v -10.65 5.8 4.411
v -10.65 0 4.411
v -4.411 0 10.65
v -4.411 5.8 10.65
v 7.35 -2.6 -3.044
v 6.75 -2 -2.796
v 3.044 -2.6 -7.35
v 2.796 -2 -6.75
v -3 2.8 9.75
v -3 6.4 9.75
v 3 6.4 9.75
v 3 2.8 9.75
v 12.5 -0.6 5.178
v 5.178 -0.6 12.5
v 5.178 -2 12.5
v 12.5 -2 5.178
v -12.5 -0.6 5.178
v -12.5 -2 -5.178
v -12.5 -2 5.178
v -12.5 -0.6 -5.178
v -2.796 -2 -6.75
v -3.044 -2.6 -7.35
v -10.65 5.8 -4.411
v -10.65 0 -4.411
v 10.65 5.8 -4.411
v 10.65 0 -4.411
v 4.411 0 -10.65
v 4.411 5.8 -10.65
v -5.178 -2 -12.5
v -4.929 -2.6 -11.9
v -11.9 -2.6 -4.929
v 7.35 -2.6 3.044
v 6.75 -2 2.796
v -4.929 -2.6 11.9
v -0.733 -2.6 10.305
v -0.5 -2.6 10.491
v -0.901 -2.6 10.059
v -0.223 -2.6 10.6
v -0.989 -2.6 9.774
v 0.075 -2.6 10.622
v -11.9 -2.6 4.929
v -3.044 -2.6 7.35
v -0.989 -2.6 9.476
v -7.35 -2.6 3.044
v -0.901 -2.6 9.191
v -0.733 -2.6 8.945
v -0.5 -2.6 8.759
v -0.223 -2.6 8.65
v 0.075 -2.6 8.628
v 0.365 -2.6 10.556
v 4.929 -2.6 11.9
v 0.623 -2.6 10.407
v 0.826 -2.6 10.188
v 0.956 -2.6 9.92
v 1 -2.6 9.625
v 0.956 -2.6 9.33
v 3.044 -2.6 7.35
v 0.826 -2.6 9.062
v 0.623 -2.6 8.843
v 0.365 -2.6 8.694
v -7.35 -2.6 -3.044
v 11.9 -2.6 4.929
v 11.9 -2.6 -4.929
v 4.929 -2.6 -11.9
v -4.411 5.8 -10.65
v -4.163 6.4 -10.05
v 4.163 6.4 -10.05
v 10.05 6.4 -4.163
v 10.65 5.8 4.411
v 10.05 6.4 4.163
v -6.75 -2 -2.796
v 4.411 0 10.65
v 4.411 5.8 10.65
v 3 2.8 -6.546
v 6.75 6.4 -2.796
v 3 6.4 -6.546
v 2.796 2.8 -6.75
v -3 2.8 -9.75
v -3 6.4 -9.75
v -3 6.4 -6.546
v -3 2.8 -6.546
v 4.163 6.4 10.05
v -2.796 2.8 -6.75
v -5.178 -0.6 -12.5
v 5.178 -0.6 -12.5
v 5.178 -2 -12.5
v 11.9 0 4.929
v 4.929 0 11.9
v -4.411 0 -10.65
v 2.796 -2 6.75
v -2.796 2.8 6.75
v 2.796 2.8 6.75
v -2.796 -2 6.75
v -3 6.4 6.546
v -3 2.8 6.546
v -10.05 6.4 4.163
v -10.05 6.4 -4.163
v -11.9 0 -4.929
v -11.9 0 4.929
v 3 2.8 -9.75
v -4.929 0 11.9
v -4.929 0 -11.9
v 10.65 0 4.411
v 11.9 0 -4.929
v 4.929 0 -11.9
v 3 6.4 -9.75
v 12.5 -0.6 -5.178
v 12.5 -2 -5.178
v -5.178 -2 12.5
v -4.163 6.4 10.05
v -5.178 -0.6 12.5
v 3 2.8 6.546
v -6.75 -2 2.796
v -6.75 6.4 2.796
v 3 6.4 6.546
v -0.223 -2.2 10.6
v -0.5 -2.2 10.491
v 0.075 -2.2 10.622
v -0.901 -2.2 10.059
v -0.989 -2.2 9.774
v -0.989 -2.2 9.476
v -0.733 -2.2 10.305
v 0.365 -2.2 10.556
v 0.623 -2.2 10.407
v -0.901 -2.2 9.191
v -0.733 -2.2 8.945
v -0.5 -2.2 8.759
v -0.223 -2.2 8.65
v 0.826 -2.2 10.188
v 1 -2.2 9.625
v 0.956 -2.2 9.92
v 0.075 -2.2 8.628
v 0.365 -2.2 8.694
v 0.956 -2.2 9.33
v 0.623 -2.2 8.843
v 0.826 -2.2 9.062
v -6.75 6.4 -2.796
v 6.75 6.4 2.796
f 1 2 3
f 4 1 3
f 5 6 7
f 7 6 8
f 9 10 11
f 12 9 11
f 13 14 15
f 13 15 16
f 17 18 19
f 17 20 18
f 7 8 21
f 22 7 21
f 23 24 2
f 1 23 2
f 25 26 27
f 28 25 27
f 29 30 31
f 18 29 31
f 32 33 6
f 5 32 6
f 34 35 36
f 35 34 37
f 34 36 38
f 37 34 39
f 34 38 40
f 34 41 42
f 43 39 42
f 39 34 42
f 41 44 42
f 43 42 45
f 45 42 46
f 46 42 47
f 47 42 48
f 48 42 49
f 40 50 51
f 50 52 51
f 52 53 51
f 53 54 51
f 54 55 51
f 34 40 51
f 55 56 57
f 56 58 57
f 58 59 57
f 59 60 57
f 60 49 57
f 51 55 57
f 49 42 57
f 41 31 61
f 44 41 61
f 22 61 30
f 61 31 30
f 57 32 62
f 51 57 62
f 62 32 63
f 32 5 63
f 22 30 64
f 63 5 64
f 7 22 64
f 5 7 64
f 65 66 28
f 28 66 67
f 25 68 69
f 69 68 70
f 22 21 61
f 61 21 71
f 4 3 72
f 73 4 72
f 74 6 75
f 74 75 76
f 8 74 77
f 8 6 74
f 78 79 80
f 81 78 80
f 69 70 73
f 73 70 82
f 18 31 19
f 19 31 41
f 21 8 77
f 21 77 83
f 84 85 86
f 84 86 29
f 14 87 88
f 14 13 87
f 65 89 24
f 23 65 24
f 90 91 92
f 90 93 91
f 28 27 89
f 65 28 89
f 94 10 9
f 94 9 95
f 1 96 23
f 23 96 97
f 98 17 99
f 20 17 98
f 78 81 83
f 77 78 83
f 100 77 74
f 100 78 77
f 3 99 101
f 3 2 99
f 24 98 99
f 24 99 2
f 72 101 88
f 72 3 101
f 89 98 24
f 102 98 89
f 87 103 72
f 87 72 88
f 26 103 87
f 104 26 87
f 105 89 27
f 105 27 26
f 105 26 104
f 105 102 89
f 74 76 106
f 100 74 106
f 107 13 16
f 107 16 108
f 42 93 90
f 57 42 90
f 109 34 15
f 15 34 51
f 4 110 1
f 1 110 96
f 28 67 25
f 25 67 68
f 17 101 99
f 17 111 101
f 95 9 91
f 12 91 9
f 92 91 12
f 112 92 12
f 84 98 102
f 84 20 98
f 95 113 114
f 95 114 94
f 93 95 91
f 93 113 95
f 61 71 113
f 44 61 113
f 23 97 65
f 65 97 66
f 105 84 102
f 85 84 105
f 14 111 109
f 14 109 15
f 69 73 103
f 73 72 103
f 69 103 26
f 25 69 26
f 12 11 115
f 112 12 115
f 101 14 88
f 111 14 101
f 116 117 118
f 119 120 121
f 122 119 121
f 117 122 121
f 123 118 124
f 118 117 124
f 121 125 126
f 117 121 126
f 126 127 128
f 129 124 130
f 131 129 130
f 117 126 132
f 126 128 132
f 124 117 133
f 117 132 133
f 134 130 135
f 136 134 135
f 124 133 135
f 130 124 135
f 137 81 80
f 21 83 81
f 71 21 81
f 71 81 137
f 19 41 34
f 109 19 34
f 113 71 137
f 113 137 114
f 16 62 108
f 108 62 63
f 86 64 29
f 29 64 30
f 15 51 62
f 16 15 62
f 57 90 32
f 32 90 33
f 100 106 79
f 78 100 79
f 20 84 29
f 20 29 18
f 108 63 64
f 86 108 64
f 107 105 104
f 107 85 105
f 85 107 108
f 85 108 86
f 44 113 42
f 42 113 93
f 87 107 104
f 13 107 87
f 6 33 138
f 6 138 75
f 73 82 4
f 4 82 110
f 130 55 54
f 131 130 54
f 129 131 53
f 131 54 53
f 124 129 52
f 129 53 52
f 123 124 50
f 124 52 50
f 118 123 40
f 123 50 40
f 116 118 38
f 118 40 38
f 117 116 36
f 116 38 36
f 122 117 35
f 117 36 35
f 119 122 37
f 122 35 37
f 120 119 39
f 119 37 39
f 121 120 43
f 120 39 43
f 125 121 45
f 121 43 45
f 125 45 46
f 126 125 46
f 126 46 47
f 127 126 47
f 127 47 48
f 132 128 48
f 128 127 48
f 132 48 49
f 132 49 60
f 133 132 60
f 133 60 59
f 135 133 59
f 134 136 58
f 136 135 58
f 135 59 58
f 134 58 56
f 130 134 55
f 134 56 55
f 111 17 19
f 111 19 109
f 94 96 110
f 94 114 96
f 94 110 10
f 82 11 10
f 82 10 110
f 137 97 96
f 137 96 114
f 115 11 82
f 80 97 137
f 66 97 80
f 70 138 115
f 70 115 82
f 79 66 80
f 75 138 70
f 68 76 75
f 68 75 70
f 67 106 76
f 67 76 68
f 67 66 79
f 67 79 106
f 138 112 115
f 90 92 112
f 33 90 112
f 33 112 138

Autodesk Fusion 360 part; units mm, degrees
sketch "Base" plane through (0, 0, 0) normal (0, 1, 0) x (1, 0, 0) in component "Squeegee Holder"
  line L0 (4.4321, 10.7) -> (-4.4321, 10.7)
  line L1 (-4.4321, 10.7) -> (-10.7, 4.4321)
  line L2 (-10.7, 4.4321) -> (-10.7, -4.4321)
  line L3 (-10.7, -4.4321) -> (-4.4321, -10.7)
  line L4 (-4.4321, -10.7) -> (4.4321, -10.7)
  line L5 (4.4321, -10.7) -> (10.7, -4.4321)
  line L6 (10.7, -4.4321) -> (10.7, 4.4321)
  line L7 (10.7, 4.4321) -> (4.4321, 10.7)
  line L8 (10.65, 4.4114) -> (4.4114, 10.65)
  line L9 (4.4114, 10.65) -> (-4.4114, 10.65)
  line L10 (-4.4114, 10.65) -> (-10.65, 4.4114)
  line L11 (-10.65, 4.4114) -> (-10.65, -4.4114)
  line L12 (-10.65, -4.4114) -> (-4.4114, -10.65)
  line L13 (-4.4114, -10.65) -> (4.4114, -10.65)
  line L14 (4.4114, -10.65) -> (10.65, -4.4114)
  line L15 (10.65, -4.4114) -> (10.65, 4.4114)
  line L16 (12.5, 5.1777) -> (5.1777, 12.5)
  line L17 (5.1777, 12.5) -> (-5.1777, 12.5)
  line L18 (-5.1777, 12.5) -> (-12.5, 5.1777)
  line L19 (-12.5, 5.1777) -> (-12.5, -5.1777)
  line L20 (-12.5, -5.1777) -> (-5.1777, -12.5)
  line L21 (-5.1777, -12.5) -> (5.1777, -12.5)
  line L22 (5.1777, -12.5) -> (12.5, -5.1777)
  line L23 (12.5, -5.1777) -> (12.5, 5.1777)
  line L24 (6.75, 2.7959) -> (2.7959, 6.75)
  line L25 (2.7959, 6.75) -> (-2.7959, 6.75)
  line L26 (-2.7959, 6.75) -> (-6.75, 2.7959)
  line L27 (-6.75, 2.7959) -> (-6.75, -2.7959)
  line L28 (-6.75, -2.7959) -> (-2.7959, -6.75)
  line L29 (-2.7959, -6.75) -> (2.7959, -6.75)
  line L30 (2.7959, -6.75) -> (6.75, -2.7959)
  line L31 (6.75, -2.7959) -> (6.75, 2.7959)
  line L32 (-4.9706, 12) -> (-12, 4.9706)
  line L33 (-12, 4.9706) -> (-12, -4.9706)
  line L34 (-12, -4.9706) -> (-4.9706, -12)
  line L35 (-4.9706, -12) -> (4.9706, -12)
  line L36 (4.9706, -12) -> (12, -4.9706)
  line L37 (12, -4.9706) -> (12, 4.9706)
  line L38 (12, 4.9706) -> (4.9706, 12)
  line L39 (4.9706, 12) -> (-4.9706, 12)
  dimension "d4" = 21.4
  dimension "d5" = 25
  dimension "d56" = 13.5
  dimension "d66" = 24
sketch "Notch" plane through (0, 0, 0) normal (0, 1, 0) x (1, 0, 0) in component "Squeegee Holder"
  line L0 (-4.4114, -10.65) -> (4.4114, -10.65) construction
  line L1 (3, -6.75) -> (-3, -6.75) construction
  line L2 (-3, -6.75) -> (-3, -9.75)
  line L3 (-3, -9.75) -> (3, -9.75)
  line L4 (3, -9.75) -> (3, -6.75)
  line L5 (-3, -6.75) -> (-3, -6.25)
  line L6 (3, -6.75) -> (3, -6.25)
  line L7 (3, -6.25) -> (-3, -6.25)
  line L8 (3, 9.75) -> (-3, 9.75)
  line L9 (-3, 9.75) -> (-3, 6.75)
  line L10 (3, 6.75) -> (3, 9.75)
  line L11 (3, 6.75) -> (3, 6.25)
  line L12 (-3, 6.75) -> (-3, 6.25)
  line L13 (-3, 6.25) -> (3, 6.25)
  line L14 (-2.7959, -6.75) -> (2.7959, -6.75)
  dimension "d24" = 6
  dimension "d25" = 3
  dimension "d31" = 360
  dimension "d57" = 0.5
extrude "Extrude5" add sketch "Base" along normal blind 6.4 contours L8 L9 L10 L11 L12 L13 L14 L15 | L24 L25 L26 L27 L28 L29 L30 L31 in component "Squeegee Holder"
extrude "Extrude10" add sketch "Base" against normal blind 2.6 contours L0 L1 L2 L3 L4 L5 L6 L7 | L8 L9 L10 L11 L12 L13 L14 L15 | L16 L17 L18 L19 L20 L21 L22 L23 | L24 L25 L26 L27 L28 L29 L30 L31 | L32 L33 L34 L35 L36 L37 L38 L39 in component "Squeegee Holder"
extrude "Extrude6" cut sketch "Base" along normal through all and the other way through all contours L24 L25 L26 L27 L28 L29 L30 L31 in component "Squeegee Holder"
extrude "Extrude8" cut sketch "Notch" against normal blind 3.6 from surface at 6.4 in component "Squeegee Holder"
sketch "Marca" plane through (0, -2.6, 0) normal (0, 1, 0) x (1, 0, 0) in component "Squeegee Holder"
  circle A0 centre (0, -9.625) radius 1
  line L0 (-2.7959, 6.75) -> (-6.75, 2.7959)
  line L1 (-6.75, 2.7959) -> (-6.75, -2.7959)
  line L2 (-6.75, -2.7959) -> (-2.7959, -6.75)
  line L3 (-2.7959, -6.75) -> (2.7959, -6.75)
  line L4 (2.7959, -6.75) -> (6.75, -2.7959)
  line L5 (6.75, -2.7959) -> (6.75, 2.7959)
  line L6 (6.75, 2.7959) -> (2.7959, 6.75)
  line L7 (2.7959, 6.75) -> (-2.7959, 6.75)
  line L8 (12.5, 5.1777) -> (12.5, -5.1777)
  line L9 (12.5, -5.1777) -> (5.1777, -12.5)
  line L10 (5.1777, -12.5) -> (-5.1777, -12.5)
  line L11 (-5.1777, -12.5) -> (-12.5, -5.1777)
  line L12 (-12.5, -5.1777) -> (-12.5, 5.1777)
  line L13 (-12.5, 5.1777) -> (-5.1777, 12.5)
  line L14 (-5.1777, 12.5) -> (5.1777, 12.5)
  line L15 (5.1777, 12.5) -> (12.5, 5.1777)
  line L16 (0, -12.5) -> (0, -6.75) construction
  dimension "d61" = 2
extrude "Extrude9" cut sketch "Marca" along normal blind 0.4 contours A0 in component "Squeegee Holder"
chamfer "Chamfer3" distance 0.6 angle 45 32 edges at (0, 6.4, 10.65) (7.5307, 6.4, 7.5307) (10.65, 6.4, 0) (7.5307, 6.4, -7.5307) (0, 6.4, -10.65) (-7.5307, 6.4, -7.5307) (-10.65, 6.4, 0) (-7.5307, 6.4, 7.5307) (12.5, 0, 0) (8.8388, 0, 8.8388) (8.8388, -2.6, 8.8388) (12.5, -2.6, 0) (0, 0, 12.5) (0, -2.6, 12.5) (8.8388, 0, -8.8388) (8.8388, -2.6, -8.8388) (0, -2.6, -12.5) (0, 0, -12.5) (-8.8388, 0, -8.8388) (-8.8388, -2.6, -8.8388) (-12.5, -2.6, 0) (-12.5, 0, 0) (-8.8388, 0, 8.8388) (-8.8388, -2.6, 8.8388) (0, -2.6, 6.75) (4.773, -2.6, 4.773) (6.75, -2.6, 0) (4.773, -2.6, -4.773) (0, -2.6, -6.75) (-4.773, -2.6, -4.773) (-6.75, -2.6, 0) (-4.773, -2.6, 4.773) in component "Squeegee Holder"
component "Squeegee Holder" placed x (1, 0, 0) y (0, 1, 0) z (0, 0, 1) at (0, 0, 0)
equation "d2 = -Clearance_Tight"
equation "d31 = 360.00 °"
equation "Clearance_Tight = 0.05 mm"
